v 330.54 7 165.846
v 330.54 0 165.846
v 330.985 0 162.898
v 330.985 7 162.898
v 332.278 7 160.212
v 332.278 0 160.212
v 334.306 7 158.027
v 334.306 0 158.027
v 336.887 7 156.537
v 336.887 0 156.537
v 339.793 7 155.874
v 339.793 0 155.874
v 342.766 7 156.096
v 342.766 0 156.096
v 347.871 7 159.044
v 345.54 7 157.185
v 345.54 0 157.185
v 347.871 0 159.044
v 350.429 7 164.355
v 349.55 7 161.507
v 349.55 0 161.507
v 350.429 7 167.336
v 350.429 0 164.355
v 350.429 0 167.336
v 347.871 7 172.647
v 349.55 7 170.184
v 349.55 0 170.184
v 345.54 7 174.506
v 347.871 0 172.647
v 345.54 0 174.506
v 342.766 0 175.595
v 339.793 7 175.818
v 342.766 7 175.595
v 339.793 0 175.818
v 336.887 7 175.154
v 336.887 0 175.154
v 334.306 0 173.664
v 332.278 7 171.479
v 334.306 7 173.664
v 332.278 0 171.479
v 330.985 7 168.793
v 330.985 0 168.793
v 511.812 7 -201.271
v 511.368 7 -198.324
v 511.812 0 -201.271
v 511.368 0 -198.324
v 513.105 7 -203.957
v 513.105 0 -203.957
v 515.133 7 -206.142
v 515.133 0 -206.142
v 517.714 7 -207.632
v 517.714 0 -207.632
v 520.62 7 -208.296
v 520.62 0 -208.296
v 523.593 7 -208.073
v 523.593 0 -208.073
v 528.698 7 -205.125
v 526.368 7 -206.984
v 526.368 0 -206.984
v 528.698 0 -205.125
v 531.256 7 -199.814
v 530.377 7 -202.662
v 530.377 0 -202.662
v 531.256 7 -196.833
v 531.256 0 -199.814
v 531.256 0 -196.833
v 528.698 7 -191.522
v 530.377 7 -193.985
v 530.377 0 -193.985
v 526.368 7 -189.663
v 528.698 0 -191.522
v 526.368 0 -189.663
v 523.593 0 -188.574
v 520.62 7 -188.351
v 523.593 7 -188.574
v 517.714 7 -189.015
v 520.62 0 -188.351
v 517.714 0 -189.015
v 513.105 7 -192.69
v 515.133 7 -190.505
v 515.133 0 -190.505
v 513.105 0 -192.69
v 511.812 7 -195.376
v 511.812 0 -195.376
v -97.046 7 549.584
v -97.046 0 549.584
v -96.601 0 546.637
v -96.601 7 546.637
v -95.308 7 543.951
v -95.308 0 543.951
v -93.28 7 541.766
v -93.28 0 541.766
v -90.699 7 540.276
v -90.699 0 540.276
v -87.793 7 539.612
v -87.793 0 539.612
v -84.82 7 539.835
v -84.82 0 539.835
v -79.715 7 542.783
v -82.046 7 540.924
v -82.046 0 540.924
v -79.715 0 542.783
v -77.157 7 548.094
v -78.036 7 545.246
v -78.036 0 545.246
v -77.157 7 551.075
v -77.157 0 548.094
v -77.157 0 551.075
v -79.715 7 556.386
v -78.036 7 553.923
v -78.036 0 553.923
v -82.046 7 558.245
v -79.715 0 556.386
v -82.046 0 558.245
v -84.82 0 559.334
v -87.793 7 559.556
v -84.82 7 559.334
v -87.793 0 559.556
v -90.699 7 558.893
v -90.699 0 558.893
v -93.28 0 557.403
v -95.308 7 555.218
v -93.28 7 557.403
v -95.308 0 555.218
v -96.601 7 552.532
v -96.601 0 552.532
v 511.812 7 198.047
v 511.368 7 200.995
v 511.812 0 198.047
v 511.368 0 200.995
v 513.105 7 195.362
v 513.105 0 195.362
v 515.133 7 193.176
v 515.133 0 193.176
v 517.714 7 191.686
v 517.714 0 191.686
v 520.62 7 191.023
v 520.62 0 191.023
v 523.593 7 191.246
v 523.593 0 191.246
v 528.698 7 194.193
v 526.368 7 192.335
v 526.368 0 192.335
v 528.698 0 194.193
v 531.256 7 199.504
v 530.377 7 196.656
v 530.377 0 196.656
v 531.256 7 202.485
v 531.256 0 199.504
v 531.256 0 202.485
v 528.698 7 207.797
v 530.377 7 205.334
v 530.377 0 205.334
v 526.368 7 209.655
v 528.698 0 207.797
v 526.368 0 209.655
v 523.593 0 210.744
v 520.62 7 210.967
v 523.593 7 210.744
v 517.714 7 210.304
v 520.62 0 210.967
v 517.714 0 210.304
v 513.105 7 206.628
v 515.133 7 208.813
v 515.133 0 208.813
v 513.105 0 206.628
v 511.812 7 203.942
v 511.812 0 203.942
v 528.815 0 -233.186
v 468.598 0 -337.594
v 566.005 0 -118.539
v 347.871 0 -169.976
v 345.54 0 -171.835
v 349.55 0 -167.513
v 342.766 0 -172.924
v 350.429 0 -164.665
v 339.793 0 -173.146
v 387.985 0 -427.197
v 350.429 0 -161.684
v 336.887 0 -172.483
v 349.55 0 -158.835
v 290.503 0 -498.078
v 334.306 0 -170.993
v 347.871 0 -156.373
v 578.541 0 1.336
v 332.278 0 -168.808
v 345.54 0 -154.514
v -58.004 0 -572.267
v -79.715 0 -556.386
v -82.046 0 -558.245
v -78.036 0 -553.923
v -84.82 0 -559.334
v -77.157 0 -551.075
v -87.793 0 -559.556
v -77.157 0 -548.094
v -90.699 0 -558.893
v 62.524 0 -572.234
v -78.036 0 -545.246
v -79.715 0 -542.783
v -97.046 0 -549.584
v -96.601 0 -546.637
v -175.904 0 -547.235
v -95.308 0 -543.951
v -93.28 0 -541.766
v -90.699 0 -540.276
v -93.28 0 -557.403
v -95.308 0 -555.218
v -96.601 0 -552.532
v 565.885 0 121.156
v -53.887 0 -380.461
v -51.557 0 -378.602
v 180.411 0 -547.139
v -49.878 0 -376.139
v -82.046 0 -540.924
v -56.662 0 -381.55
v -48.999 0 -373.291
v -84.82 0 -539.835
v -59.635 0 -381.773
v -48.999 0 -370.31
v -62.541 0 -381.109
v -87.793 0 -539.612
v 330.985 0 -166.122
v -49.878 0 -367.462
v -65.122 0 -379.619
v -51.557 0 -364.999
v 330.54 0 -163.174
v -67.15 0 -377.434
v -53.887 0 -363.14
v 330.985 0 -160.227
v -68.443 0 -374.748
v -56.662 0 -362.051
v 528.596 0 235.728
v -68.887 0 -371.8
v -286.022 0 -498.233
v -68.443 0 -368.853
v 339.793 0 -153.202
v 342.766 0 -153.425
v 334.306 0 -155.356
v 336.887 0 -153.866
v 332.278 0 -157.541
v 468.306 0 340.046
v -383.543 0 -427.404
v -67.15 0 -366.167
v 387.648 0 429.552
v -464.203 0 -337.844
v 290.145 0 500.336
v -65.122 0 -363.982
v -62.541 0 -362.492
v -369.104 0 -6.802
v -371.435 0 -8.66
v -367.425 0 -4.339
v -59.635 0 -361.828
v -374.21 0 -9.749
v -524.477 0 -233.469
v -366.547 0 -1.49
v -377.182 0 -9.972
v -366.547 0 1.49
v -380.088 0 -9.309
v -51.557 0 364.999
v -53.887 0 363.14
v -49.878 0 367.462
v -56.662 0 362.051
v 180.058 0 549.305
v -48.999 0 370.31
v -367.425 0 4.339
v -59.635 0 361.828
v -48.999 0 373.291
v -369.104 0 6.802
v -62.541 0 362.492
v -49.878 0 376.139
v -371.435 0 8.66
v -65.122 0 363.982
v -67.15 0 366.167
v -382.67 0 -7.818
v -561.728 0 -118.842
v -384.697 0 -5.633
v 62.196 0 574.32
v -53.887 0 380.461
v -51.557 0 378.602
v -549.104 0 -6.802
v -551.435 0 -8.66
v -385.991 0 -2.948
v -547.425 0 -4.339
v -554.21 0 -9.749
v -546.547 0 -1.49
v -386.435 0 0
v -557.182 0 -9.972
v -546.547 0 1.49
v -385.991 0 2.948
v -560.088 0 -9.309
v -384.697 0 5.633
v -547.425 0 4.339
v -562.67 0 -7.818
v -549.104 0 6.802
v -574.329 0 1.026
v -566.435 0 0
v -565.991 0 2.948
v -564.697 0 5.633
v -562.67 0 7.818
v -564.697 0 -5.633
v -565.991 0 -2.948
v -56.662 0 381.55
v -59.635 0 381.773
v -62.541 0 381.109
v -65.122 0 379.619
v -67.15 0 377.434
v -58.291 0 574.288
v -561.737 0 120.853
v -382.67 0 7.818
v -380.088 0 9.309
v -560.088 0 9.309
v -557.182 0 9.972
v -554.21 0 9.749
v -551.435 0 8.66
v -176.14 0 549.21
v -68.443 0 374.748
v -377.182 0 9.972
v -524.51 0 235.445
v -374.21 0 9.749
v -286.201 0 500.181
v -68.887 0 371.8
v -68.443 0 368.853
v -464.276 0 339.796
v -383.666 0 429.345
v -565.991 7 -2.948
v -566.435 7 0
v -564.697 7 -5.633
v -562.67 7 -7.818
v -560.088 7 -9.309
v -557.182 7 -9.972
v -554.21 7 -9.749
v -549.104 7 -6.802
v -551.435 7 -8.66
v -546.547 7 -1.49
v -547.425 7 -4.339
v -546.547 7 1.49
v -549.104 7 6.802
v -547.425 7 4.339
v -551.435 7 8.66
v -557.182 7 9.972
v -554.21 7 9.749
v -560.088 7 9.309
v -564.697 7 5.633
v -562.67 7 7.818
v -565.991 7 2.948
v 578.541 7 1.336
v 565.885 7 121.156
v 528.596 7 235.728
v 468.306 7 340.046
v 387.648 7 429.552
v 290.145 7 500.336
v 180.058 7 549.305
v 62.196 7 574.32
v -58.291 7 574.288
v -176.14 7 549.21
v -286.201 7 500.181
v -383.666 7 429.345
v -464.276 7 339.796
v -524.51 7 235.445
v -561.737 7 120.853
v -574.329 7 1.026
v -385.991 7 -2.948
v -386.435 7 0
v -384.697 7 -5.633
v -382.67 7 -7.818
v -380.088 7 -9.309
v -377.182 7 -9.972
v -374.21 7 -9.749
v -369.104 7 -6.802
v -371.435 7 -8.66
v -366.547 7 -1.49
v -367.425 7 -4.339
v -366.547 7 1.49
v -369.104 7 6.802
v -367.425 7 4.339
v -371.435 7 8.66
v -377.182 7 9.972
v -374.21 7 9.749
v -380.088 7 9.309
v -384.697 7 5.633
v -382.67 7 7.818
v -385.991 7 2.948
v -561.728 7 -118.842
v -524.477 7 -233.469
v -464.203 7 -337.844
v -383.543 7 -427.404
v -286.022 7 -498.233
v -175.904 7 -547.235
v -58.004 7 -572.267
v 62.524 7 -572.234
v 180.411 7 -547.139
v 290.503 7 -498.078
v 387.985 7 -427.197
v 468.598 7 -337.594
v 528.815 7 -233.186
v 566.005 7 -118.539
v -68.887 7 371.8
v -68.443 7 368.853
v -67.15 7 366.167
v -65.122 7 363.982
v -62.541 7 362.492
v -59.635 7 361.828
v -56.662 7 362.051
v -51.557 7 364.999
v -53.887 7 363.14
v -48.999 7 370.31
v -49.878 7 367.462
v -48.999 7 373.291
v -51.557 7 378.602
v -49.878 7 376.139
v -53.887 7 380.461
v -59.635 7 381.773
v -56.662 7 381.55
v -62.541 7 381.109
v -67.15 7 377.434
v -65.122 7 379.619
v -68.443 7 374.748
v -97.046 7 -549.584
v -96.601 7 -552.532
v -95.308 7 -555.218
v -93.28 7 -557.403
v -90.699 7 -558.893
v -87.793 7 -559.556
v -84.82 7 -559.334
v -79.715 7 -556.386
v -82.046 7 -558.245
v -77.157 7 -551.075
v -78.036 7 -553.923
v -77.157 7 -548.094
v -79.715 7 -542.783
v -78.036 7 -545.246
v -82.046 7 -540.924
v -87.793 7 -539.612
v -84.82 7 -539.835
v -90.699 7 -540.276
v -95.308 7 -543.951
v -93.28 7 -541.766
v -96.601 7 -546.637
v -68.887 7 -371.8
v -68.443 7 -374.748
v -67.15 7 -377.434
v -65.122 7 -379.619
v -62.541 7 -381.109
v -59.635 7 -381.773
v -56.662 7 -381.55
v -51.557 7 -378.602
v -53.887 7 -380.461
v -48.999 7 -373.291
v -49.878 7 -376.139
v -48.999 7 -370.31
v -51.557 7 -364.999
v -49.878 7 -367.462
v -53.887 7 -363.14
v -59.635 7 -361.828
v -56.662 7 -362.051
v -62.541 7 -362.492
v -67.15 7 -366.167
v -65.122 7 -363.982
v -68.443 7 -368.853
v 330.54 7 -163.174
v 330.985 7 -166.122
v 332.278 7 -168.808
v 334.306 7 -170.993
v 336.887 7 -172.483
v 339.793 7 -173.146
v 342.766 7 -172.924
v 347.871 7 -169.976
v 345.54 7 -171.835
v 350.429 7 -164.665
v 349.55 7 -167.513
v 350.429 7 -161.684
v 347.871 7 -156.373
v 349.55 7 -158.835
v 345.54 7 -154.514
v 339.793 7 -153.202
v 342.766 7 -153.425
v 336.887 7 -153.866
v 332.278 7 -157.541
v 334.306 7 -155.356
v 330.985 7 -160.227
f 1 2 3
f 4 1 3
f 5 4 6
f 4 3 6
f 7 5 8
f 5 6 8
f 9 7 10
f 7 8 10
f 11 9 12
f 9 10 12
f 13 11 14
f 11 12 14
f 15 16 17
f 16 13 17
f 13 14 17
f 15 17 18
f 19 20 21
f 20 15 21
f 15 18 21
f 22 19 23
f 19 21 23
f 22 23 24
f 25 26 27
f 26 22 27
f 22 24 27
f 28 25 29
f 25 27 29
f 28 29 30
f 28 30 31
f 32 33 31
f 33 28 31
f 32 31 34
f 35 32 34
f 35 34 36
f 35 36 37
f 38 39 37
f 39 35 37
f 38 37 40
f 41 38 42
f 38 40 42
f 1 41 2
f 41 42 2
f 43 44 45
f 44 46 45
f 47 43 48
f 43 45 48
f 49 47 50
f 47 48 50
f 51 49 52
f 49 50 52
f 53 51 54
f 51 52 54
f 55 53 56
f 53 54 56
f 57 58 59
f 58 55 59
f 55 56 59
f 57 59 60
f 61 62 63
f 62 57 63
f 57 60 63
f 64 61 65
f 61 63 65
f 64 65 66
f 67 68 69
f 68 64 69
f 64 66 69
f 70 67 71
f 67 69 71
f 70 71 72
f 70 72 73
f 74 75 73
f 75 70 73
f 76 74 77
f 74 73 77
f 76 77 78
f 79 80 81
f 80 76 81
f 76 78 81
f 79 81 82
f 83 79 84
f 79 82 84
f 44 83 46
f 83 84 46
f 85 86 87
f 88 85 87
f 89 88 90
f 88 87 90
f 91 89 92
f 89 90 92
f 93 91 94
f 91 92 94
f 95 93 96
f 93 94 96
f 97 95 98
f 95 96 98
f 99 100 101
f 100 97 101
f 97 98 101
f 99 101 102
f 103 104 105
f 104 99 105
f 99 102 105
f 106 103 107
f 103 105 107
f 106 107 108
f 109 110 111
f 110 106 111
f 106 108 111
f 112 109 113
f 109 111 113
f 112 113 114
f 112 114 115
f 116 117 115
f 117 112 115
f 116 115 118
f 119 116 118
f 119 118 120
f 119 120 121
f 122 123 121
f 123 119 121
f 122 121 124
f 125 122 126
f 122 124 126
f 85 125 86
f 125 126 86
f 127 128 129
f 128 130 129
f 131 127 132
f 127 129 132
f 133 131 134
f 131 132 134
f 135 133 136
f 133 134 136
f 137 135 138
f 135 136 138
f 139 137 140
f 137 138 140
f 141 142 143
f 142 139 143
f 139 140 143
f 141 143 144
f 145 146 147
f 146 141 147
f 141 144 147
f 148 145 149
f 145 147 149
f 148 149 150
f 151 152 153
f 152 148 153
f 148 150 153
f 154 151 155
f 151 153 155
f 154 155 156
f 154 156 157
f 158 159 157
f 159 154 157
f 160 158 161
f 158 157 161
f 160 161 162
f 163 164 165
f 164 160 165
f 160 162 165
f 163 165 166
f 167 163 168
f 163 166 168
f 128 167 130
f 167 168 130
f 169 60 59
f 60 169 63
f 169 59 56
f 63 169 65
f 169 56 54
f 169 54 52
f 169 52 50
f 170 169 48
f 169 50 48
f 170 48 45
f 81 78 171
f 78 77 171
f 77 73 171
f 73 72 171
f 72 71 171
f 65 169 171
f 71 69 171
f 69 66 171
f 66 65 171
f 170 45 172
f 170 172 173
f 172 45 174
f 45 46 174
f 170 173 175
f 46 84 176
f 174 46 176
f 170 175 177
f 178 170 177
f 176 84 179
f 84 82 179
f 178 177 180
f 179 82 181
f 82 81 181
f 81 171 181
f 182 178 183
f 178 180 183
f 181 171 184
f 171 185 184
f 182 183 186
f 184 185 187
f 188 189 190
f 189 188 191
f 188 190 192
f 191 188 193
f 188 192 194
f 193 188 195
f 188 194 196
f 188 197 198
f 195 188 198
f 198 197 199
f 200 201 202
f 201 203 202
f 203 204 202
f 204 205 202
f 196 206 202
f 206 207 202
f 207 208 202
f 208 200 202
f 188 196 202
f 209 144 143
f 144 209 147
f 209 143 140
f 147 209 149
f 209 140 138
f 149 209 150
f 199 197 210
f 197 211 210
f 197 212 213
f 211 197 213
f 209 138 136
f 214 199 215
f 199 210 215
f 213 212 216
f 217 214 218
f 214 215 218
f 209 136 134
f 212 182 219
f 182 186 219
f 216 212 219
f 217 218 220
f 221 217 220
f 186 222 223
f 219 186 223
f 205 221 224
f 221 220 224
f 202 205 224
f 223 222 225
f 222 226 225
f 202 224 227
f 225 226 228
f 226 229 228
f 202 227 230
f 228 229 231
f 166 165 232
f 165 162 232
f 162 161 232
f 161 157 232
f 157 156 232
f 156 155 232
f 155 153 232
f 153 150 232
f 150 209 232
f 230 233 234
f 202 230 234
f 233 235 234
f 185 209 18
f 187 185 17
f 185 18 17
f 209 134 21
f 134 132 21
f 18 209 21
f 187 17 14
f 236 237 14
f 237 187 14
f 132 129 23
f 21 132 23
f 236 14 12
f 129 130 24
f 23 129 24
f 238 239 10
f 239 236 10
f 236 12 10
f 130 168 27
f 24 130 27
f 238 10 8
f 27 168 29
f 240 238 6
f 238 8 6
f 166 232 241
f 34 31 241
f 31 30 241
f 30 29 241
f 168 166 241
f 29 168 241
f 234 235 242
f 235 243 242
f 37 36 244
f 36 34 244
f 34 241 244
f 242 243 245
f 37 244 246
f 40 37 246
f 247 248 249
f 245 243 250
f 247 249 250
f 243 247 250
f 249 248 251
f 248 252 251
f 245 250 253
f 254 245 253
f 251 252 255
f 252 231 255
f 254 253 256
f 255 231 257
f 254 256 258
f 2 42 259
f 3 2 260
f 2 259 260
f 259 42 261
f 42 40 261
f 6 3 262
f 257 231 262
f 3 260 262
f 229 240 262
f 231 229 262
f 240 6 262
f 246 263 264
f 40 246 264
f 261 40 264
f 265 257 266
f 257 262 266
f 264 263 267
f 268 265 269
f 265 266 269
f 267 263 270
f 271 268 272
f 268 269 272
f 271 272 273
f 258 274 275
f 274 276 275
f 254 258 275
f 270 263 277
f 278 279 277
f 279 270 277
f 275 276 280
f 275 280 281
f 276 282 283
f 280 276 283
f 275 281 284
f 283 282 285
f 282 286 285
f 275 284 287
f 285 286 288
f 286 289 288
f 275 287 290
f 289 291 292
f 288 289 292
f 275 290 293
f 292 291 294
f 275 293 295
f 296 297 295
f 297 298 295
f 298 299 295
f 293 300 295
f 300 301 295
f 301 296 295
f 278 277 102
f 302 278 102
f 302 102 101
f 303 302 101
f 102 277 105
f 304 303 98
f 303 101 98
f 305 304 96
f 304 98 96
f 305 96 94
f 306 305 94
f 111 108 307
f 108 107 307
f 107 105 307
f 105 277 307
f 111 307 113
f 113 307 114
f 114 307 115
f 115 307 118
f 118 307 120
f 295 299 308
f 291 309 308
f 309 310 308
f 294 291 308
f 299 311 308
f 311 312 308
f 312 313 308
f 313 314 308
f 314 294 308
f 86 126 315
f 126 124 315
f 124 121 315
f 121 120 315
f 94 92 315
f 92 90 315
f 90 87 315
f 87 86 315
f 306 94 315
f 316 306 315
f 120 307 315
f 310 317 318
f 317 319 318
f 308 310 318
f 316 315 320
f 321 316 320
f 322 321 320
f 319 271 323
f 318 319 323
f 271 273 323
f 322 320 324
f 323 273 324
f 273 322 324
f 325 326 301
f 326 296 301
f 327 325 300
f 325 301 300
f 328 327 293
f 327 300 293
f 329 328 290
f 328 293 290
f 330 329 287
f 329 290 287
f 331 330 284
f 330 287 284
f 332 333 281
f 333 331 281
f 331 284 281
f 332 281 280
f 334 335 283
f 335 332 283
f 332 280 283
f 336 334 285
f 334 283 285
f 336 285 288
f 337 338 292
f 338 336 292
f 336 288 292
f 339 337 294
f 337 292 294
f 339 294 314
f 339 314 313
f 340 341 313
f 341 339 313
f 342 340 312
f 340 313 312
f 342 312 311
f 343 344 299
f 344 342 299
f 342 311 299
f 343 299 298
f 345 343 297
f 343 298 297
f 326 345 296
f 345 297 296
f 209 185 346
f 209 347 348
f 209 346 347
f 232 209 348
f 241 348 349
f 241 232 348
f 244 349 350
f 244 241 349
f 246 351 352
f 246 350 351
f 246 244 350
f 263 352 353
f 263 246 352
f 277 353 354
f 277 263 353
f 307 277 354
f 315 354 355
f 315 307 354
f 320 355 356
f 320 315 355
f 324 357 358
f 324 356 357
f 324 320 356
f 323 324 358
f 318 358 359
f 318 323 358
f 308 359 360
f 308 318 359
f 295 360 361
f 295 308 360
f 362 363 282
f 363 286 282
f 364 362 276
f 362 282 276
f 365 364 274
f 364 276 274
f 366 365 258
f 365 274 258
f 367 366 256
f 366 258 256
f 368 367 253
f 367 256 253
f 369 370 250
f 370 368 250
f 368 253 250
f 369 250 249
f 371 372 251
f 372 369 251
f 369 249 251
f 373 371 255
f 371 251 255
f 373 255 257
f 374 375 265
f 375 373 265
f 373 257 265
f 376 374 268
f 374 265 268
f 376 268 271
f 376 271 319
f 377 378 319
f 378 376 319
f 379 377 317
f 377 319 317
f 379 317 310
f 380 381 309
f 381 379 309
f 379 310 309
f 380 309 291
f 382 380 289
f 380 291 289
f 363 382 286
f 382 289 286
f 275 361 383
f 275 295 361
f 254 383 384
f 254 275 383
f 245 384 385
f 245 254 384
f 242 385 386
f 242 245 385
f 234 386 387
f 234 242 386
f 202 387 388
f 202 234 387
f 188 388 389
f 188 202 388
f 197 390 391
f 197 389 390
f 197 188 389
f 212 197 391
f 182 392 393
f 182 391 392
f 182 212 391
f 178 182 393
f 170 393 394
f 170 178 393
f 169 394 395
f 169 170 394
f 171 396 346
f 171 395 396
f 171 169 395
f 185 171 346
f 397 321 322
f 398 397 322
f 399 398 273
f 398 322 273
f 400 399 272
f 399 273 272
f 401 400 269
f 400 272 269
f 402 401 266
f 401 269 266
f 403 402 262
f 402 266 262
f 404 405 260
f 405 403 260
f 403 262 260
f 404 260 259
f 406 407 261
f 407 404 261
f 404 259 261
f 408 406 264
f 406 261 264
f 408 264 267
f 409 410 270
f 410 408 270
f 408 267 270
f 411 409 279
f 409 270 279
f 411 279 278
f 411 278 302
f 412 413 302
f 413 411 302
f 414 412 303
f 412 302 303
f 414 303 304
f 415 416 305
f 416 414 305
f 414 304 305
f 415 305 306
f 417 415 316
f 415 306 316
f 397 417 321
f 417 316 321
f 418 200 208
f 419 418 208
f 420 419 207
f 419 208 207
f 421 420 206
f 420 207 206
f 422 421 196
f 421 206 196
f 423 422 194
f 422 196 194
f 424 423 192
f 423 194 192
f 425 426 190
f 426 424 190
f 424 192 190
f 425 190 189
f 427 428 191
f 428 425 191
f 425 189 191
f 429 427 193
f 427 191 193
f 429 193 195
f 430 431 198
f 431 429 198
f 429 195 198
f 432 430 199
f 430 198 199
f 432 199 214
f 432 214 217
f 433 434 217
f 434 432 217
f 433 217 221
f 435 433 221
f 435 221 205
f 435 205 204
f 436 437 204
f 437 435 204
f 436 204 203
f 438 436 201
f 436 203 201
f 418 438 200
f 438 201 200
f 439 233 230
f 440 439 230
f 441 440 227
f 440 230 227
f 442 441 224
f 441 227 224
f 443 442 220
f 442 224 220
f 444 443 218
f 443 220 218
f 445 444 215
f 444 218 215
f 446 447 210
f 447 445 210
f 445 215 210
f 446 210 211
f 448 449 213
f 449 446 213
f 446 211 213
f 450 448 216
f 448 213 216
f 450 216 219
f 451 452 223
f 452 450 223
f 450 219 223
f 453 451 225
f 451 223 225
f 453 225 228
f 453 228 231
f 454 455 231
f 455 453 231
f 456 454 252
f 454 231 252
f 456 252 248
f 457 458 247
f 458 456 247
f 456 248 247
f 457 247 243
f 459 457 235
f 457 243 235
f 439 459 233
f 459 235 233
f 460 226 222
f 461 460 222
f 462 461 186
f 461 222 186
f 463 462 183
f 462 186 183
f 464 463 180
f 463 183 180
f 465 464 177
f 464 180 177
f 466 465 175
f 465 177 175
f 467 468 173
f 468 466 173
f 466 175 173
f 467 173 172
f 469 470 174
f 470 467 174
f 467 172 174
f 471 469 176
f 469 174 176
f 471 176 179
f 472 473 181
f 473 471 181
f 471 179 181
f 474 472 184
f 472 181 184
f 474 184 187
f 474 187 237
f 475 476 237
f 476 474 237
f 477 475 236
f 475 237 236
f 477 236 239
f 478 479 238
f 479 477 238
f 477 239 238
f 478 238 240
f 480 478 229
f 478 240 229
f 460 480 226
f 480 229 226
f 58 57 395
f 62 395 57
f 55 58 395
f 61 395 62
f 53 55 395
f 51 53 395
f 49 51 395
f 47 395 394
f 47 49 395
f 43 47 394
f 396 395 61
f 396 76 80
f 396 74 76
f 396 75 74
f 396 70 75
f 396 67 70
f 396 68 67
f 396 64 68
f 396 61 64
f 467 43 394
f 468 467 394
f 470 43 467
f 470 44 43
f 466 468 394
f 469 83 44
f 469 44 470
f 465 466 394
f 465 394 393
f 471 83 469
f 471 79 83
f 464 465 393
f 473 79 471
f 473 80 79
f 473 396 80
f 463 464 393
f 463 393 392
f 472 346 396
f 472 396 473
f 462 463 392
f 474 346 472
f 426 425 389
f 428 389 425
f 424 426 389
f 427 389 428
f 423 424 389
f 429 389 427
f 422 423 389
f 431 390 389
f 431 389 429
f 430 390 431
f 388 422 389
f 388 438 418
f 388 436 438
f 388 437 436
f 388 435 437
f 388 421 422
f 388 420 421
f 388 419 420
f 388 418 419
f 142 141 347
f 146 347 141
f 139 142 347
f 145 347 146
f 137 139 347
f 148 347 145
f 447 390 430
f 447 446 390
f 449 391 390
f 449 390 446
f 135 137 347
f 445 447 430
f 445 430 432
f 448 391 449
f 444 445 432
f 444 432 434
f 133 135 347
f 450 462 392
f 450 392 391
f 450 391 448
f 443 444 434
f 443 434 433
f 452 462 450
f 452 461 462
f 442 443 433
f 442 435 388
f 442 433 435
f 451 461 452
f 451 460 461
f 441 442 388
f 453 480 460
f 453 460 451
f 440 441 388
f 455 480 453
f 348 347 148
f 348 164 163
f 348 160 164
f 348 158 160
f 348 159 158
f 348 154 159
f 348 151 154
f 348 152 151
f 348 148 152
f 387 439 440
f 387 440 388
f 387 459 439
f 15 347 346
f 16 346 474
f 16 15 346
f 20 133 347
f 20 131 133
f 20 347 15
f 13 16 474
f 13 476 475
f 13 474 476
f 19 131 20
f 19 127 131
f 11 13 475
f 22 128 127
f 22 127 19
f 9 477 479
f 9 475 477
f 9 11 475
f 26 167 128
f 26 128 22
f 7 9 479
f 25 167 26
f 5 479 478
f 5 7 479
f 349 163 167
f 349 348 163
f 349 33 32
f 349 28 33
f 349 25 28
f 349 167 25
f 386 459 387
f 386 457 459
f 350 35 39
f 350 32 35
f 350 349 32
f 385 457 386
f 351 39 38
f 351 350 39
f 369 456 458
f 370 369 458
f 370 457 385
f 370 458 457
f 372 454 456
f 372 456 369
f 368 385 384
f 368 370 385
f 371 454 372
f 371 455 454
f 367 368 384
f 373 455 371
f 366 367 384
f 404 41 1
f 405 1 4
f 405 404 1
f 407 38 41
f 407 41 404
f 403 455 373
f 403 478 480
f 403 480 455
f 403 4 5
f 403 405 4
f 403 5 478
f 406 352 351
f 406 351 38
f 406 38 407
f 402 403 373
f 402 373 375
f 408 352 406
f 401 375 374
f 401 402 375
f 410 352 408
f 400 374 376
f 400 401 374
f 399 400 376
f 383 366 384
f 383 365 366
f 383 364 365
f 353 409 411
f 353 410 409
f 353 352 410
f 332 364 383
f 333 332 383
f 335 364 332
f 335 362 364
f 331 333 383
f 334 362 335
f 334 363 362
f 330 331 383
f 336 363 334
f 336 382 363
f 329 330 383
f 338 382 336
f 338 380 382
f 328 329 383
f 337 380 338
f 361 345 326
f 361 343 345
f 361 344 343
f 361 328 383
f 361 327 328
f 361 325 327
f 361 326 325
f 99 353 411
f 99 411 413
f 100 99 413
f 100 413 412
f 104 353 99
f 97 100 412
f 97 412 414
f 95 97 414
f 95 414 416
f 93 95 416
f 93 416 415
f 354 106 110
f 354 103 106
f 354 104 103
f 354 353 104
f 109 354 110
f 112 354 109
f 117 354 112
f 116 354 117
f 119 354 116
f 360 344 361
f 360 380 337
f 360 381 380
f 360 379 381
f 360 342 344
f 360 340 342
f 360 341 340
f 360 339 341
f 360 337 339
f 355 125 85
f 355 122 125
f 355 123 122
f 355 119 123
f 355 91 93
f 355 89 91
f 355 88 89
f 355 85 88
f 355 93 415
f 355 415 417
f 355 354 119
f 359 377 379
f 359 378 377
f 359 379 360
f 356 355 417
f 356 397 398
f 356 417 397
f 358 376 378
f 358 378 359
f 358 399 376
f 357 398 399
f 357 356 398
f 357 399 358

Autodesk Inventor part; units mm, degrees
ref_plane "YZ Plane" through (0, 0, 0) normal (1, 0, 0) x (0, 1, 0)
ref_plane "XZ Plane" through (0, 0, 0) normal (0, 1, 0) x (-1, 0, 0)
ref_plane "XY Plane" through (0, 0, 0) normal (0, 0, 1) x (1, 0, 0)
sketch "Sketch1" plane through (0, 0, 0) normal (0, 1, 0) x (-1, 0, 0)
  circle A0 centre (-2.1062, 1.0257) radius 576.435
  circle A1 centre (-340.5404, 165.8456) radius 10
  circle A2 centre (-521.3675, 200.9948) radius 10
  line L0 (-296.1915, 1.3356) -> (-698.7298, 1.3356)
  circle A3 centre (-340.5404, -163.1743) radius 10
  circle A4 centre (-521.3675, -198.3235) radius 10
  circle A5 centre (376.435, 0) radius 10
  circle A6 centre (556.435, 0) radius 10
  circle A7 centre (58.8874, 371.8005) radius 10
  circle A8 centre (87.0456, 549.5844) radius 10
  circle A9 centre (58.8874, -371.8005) radius 10
  circle A10 centre (87.0456, -549.5844) radius 10
  point P0 (0, 0)
  point P1 (-578.5411, 1.3356)
  dimension "d34" = 1152.87
  dimension "d52" = 20
  dimension "d55" = 20
  dimension "d58" = 556.435
  dimension "d59" = 20
  dimension "d60" = 376.435
  dimension "d61" = 20
  dimension "d62" = 556.435
  dimension "d65" = 81
  dimension "d69" = 81
extrude "Extrusion1" add sketch "Sketch1" along normal blind 7
properties part number "TopandBase"
